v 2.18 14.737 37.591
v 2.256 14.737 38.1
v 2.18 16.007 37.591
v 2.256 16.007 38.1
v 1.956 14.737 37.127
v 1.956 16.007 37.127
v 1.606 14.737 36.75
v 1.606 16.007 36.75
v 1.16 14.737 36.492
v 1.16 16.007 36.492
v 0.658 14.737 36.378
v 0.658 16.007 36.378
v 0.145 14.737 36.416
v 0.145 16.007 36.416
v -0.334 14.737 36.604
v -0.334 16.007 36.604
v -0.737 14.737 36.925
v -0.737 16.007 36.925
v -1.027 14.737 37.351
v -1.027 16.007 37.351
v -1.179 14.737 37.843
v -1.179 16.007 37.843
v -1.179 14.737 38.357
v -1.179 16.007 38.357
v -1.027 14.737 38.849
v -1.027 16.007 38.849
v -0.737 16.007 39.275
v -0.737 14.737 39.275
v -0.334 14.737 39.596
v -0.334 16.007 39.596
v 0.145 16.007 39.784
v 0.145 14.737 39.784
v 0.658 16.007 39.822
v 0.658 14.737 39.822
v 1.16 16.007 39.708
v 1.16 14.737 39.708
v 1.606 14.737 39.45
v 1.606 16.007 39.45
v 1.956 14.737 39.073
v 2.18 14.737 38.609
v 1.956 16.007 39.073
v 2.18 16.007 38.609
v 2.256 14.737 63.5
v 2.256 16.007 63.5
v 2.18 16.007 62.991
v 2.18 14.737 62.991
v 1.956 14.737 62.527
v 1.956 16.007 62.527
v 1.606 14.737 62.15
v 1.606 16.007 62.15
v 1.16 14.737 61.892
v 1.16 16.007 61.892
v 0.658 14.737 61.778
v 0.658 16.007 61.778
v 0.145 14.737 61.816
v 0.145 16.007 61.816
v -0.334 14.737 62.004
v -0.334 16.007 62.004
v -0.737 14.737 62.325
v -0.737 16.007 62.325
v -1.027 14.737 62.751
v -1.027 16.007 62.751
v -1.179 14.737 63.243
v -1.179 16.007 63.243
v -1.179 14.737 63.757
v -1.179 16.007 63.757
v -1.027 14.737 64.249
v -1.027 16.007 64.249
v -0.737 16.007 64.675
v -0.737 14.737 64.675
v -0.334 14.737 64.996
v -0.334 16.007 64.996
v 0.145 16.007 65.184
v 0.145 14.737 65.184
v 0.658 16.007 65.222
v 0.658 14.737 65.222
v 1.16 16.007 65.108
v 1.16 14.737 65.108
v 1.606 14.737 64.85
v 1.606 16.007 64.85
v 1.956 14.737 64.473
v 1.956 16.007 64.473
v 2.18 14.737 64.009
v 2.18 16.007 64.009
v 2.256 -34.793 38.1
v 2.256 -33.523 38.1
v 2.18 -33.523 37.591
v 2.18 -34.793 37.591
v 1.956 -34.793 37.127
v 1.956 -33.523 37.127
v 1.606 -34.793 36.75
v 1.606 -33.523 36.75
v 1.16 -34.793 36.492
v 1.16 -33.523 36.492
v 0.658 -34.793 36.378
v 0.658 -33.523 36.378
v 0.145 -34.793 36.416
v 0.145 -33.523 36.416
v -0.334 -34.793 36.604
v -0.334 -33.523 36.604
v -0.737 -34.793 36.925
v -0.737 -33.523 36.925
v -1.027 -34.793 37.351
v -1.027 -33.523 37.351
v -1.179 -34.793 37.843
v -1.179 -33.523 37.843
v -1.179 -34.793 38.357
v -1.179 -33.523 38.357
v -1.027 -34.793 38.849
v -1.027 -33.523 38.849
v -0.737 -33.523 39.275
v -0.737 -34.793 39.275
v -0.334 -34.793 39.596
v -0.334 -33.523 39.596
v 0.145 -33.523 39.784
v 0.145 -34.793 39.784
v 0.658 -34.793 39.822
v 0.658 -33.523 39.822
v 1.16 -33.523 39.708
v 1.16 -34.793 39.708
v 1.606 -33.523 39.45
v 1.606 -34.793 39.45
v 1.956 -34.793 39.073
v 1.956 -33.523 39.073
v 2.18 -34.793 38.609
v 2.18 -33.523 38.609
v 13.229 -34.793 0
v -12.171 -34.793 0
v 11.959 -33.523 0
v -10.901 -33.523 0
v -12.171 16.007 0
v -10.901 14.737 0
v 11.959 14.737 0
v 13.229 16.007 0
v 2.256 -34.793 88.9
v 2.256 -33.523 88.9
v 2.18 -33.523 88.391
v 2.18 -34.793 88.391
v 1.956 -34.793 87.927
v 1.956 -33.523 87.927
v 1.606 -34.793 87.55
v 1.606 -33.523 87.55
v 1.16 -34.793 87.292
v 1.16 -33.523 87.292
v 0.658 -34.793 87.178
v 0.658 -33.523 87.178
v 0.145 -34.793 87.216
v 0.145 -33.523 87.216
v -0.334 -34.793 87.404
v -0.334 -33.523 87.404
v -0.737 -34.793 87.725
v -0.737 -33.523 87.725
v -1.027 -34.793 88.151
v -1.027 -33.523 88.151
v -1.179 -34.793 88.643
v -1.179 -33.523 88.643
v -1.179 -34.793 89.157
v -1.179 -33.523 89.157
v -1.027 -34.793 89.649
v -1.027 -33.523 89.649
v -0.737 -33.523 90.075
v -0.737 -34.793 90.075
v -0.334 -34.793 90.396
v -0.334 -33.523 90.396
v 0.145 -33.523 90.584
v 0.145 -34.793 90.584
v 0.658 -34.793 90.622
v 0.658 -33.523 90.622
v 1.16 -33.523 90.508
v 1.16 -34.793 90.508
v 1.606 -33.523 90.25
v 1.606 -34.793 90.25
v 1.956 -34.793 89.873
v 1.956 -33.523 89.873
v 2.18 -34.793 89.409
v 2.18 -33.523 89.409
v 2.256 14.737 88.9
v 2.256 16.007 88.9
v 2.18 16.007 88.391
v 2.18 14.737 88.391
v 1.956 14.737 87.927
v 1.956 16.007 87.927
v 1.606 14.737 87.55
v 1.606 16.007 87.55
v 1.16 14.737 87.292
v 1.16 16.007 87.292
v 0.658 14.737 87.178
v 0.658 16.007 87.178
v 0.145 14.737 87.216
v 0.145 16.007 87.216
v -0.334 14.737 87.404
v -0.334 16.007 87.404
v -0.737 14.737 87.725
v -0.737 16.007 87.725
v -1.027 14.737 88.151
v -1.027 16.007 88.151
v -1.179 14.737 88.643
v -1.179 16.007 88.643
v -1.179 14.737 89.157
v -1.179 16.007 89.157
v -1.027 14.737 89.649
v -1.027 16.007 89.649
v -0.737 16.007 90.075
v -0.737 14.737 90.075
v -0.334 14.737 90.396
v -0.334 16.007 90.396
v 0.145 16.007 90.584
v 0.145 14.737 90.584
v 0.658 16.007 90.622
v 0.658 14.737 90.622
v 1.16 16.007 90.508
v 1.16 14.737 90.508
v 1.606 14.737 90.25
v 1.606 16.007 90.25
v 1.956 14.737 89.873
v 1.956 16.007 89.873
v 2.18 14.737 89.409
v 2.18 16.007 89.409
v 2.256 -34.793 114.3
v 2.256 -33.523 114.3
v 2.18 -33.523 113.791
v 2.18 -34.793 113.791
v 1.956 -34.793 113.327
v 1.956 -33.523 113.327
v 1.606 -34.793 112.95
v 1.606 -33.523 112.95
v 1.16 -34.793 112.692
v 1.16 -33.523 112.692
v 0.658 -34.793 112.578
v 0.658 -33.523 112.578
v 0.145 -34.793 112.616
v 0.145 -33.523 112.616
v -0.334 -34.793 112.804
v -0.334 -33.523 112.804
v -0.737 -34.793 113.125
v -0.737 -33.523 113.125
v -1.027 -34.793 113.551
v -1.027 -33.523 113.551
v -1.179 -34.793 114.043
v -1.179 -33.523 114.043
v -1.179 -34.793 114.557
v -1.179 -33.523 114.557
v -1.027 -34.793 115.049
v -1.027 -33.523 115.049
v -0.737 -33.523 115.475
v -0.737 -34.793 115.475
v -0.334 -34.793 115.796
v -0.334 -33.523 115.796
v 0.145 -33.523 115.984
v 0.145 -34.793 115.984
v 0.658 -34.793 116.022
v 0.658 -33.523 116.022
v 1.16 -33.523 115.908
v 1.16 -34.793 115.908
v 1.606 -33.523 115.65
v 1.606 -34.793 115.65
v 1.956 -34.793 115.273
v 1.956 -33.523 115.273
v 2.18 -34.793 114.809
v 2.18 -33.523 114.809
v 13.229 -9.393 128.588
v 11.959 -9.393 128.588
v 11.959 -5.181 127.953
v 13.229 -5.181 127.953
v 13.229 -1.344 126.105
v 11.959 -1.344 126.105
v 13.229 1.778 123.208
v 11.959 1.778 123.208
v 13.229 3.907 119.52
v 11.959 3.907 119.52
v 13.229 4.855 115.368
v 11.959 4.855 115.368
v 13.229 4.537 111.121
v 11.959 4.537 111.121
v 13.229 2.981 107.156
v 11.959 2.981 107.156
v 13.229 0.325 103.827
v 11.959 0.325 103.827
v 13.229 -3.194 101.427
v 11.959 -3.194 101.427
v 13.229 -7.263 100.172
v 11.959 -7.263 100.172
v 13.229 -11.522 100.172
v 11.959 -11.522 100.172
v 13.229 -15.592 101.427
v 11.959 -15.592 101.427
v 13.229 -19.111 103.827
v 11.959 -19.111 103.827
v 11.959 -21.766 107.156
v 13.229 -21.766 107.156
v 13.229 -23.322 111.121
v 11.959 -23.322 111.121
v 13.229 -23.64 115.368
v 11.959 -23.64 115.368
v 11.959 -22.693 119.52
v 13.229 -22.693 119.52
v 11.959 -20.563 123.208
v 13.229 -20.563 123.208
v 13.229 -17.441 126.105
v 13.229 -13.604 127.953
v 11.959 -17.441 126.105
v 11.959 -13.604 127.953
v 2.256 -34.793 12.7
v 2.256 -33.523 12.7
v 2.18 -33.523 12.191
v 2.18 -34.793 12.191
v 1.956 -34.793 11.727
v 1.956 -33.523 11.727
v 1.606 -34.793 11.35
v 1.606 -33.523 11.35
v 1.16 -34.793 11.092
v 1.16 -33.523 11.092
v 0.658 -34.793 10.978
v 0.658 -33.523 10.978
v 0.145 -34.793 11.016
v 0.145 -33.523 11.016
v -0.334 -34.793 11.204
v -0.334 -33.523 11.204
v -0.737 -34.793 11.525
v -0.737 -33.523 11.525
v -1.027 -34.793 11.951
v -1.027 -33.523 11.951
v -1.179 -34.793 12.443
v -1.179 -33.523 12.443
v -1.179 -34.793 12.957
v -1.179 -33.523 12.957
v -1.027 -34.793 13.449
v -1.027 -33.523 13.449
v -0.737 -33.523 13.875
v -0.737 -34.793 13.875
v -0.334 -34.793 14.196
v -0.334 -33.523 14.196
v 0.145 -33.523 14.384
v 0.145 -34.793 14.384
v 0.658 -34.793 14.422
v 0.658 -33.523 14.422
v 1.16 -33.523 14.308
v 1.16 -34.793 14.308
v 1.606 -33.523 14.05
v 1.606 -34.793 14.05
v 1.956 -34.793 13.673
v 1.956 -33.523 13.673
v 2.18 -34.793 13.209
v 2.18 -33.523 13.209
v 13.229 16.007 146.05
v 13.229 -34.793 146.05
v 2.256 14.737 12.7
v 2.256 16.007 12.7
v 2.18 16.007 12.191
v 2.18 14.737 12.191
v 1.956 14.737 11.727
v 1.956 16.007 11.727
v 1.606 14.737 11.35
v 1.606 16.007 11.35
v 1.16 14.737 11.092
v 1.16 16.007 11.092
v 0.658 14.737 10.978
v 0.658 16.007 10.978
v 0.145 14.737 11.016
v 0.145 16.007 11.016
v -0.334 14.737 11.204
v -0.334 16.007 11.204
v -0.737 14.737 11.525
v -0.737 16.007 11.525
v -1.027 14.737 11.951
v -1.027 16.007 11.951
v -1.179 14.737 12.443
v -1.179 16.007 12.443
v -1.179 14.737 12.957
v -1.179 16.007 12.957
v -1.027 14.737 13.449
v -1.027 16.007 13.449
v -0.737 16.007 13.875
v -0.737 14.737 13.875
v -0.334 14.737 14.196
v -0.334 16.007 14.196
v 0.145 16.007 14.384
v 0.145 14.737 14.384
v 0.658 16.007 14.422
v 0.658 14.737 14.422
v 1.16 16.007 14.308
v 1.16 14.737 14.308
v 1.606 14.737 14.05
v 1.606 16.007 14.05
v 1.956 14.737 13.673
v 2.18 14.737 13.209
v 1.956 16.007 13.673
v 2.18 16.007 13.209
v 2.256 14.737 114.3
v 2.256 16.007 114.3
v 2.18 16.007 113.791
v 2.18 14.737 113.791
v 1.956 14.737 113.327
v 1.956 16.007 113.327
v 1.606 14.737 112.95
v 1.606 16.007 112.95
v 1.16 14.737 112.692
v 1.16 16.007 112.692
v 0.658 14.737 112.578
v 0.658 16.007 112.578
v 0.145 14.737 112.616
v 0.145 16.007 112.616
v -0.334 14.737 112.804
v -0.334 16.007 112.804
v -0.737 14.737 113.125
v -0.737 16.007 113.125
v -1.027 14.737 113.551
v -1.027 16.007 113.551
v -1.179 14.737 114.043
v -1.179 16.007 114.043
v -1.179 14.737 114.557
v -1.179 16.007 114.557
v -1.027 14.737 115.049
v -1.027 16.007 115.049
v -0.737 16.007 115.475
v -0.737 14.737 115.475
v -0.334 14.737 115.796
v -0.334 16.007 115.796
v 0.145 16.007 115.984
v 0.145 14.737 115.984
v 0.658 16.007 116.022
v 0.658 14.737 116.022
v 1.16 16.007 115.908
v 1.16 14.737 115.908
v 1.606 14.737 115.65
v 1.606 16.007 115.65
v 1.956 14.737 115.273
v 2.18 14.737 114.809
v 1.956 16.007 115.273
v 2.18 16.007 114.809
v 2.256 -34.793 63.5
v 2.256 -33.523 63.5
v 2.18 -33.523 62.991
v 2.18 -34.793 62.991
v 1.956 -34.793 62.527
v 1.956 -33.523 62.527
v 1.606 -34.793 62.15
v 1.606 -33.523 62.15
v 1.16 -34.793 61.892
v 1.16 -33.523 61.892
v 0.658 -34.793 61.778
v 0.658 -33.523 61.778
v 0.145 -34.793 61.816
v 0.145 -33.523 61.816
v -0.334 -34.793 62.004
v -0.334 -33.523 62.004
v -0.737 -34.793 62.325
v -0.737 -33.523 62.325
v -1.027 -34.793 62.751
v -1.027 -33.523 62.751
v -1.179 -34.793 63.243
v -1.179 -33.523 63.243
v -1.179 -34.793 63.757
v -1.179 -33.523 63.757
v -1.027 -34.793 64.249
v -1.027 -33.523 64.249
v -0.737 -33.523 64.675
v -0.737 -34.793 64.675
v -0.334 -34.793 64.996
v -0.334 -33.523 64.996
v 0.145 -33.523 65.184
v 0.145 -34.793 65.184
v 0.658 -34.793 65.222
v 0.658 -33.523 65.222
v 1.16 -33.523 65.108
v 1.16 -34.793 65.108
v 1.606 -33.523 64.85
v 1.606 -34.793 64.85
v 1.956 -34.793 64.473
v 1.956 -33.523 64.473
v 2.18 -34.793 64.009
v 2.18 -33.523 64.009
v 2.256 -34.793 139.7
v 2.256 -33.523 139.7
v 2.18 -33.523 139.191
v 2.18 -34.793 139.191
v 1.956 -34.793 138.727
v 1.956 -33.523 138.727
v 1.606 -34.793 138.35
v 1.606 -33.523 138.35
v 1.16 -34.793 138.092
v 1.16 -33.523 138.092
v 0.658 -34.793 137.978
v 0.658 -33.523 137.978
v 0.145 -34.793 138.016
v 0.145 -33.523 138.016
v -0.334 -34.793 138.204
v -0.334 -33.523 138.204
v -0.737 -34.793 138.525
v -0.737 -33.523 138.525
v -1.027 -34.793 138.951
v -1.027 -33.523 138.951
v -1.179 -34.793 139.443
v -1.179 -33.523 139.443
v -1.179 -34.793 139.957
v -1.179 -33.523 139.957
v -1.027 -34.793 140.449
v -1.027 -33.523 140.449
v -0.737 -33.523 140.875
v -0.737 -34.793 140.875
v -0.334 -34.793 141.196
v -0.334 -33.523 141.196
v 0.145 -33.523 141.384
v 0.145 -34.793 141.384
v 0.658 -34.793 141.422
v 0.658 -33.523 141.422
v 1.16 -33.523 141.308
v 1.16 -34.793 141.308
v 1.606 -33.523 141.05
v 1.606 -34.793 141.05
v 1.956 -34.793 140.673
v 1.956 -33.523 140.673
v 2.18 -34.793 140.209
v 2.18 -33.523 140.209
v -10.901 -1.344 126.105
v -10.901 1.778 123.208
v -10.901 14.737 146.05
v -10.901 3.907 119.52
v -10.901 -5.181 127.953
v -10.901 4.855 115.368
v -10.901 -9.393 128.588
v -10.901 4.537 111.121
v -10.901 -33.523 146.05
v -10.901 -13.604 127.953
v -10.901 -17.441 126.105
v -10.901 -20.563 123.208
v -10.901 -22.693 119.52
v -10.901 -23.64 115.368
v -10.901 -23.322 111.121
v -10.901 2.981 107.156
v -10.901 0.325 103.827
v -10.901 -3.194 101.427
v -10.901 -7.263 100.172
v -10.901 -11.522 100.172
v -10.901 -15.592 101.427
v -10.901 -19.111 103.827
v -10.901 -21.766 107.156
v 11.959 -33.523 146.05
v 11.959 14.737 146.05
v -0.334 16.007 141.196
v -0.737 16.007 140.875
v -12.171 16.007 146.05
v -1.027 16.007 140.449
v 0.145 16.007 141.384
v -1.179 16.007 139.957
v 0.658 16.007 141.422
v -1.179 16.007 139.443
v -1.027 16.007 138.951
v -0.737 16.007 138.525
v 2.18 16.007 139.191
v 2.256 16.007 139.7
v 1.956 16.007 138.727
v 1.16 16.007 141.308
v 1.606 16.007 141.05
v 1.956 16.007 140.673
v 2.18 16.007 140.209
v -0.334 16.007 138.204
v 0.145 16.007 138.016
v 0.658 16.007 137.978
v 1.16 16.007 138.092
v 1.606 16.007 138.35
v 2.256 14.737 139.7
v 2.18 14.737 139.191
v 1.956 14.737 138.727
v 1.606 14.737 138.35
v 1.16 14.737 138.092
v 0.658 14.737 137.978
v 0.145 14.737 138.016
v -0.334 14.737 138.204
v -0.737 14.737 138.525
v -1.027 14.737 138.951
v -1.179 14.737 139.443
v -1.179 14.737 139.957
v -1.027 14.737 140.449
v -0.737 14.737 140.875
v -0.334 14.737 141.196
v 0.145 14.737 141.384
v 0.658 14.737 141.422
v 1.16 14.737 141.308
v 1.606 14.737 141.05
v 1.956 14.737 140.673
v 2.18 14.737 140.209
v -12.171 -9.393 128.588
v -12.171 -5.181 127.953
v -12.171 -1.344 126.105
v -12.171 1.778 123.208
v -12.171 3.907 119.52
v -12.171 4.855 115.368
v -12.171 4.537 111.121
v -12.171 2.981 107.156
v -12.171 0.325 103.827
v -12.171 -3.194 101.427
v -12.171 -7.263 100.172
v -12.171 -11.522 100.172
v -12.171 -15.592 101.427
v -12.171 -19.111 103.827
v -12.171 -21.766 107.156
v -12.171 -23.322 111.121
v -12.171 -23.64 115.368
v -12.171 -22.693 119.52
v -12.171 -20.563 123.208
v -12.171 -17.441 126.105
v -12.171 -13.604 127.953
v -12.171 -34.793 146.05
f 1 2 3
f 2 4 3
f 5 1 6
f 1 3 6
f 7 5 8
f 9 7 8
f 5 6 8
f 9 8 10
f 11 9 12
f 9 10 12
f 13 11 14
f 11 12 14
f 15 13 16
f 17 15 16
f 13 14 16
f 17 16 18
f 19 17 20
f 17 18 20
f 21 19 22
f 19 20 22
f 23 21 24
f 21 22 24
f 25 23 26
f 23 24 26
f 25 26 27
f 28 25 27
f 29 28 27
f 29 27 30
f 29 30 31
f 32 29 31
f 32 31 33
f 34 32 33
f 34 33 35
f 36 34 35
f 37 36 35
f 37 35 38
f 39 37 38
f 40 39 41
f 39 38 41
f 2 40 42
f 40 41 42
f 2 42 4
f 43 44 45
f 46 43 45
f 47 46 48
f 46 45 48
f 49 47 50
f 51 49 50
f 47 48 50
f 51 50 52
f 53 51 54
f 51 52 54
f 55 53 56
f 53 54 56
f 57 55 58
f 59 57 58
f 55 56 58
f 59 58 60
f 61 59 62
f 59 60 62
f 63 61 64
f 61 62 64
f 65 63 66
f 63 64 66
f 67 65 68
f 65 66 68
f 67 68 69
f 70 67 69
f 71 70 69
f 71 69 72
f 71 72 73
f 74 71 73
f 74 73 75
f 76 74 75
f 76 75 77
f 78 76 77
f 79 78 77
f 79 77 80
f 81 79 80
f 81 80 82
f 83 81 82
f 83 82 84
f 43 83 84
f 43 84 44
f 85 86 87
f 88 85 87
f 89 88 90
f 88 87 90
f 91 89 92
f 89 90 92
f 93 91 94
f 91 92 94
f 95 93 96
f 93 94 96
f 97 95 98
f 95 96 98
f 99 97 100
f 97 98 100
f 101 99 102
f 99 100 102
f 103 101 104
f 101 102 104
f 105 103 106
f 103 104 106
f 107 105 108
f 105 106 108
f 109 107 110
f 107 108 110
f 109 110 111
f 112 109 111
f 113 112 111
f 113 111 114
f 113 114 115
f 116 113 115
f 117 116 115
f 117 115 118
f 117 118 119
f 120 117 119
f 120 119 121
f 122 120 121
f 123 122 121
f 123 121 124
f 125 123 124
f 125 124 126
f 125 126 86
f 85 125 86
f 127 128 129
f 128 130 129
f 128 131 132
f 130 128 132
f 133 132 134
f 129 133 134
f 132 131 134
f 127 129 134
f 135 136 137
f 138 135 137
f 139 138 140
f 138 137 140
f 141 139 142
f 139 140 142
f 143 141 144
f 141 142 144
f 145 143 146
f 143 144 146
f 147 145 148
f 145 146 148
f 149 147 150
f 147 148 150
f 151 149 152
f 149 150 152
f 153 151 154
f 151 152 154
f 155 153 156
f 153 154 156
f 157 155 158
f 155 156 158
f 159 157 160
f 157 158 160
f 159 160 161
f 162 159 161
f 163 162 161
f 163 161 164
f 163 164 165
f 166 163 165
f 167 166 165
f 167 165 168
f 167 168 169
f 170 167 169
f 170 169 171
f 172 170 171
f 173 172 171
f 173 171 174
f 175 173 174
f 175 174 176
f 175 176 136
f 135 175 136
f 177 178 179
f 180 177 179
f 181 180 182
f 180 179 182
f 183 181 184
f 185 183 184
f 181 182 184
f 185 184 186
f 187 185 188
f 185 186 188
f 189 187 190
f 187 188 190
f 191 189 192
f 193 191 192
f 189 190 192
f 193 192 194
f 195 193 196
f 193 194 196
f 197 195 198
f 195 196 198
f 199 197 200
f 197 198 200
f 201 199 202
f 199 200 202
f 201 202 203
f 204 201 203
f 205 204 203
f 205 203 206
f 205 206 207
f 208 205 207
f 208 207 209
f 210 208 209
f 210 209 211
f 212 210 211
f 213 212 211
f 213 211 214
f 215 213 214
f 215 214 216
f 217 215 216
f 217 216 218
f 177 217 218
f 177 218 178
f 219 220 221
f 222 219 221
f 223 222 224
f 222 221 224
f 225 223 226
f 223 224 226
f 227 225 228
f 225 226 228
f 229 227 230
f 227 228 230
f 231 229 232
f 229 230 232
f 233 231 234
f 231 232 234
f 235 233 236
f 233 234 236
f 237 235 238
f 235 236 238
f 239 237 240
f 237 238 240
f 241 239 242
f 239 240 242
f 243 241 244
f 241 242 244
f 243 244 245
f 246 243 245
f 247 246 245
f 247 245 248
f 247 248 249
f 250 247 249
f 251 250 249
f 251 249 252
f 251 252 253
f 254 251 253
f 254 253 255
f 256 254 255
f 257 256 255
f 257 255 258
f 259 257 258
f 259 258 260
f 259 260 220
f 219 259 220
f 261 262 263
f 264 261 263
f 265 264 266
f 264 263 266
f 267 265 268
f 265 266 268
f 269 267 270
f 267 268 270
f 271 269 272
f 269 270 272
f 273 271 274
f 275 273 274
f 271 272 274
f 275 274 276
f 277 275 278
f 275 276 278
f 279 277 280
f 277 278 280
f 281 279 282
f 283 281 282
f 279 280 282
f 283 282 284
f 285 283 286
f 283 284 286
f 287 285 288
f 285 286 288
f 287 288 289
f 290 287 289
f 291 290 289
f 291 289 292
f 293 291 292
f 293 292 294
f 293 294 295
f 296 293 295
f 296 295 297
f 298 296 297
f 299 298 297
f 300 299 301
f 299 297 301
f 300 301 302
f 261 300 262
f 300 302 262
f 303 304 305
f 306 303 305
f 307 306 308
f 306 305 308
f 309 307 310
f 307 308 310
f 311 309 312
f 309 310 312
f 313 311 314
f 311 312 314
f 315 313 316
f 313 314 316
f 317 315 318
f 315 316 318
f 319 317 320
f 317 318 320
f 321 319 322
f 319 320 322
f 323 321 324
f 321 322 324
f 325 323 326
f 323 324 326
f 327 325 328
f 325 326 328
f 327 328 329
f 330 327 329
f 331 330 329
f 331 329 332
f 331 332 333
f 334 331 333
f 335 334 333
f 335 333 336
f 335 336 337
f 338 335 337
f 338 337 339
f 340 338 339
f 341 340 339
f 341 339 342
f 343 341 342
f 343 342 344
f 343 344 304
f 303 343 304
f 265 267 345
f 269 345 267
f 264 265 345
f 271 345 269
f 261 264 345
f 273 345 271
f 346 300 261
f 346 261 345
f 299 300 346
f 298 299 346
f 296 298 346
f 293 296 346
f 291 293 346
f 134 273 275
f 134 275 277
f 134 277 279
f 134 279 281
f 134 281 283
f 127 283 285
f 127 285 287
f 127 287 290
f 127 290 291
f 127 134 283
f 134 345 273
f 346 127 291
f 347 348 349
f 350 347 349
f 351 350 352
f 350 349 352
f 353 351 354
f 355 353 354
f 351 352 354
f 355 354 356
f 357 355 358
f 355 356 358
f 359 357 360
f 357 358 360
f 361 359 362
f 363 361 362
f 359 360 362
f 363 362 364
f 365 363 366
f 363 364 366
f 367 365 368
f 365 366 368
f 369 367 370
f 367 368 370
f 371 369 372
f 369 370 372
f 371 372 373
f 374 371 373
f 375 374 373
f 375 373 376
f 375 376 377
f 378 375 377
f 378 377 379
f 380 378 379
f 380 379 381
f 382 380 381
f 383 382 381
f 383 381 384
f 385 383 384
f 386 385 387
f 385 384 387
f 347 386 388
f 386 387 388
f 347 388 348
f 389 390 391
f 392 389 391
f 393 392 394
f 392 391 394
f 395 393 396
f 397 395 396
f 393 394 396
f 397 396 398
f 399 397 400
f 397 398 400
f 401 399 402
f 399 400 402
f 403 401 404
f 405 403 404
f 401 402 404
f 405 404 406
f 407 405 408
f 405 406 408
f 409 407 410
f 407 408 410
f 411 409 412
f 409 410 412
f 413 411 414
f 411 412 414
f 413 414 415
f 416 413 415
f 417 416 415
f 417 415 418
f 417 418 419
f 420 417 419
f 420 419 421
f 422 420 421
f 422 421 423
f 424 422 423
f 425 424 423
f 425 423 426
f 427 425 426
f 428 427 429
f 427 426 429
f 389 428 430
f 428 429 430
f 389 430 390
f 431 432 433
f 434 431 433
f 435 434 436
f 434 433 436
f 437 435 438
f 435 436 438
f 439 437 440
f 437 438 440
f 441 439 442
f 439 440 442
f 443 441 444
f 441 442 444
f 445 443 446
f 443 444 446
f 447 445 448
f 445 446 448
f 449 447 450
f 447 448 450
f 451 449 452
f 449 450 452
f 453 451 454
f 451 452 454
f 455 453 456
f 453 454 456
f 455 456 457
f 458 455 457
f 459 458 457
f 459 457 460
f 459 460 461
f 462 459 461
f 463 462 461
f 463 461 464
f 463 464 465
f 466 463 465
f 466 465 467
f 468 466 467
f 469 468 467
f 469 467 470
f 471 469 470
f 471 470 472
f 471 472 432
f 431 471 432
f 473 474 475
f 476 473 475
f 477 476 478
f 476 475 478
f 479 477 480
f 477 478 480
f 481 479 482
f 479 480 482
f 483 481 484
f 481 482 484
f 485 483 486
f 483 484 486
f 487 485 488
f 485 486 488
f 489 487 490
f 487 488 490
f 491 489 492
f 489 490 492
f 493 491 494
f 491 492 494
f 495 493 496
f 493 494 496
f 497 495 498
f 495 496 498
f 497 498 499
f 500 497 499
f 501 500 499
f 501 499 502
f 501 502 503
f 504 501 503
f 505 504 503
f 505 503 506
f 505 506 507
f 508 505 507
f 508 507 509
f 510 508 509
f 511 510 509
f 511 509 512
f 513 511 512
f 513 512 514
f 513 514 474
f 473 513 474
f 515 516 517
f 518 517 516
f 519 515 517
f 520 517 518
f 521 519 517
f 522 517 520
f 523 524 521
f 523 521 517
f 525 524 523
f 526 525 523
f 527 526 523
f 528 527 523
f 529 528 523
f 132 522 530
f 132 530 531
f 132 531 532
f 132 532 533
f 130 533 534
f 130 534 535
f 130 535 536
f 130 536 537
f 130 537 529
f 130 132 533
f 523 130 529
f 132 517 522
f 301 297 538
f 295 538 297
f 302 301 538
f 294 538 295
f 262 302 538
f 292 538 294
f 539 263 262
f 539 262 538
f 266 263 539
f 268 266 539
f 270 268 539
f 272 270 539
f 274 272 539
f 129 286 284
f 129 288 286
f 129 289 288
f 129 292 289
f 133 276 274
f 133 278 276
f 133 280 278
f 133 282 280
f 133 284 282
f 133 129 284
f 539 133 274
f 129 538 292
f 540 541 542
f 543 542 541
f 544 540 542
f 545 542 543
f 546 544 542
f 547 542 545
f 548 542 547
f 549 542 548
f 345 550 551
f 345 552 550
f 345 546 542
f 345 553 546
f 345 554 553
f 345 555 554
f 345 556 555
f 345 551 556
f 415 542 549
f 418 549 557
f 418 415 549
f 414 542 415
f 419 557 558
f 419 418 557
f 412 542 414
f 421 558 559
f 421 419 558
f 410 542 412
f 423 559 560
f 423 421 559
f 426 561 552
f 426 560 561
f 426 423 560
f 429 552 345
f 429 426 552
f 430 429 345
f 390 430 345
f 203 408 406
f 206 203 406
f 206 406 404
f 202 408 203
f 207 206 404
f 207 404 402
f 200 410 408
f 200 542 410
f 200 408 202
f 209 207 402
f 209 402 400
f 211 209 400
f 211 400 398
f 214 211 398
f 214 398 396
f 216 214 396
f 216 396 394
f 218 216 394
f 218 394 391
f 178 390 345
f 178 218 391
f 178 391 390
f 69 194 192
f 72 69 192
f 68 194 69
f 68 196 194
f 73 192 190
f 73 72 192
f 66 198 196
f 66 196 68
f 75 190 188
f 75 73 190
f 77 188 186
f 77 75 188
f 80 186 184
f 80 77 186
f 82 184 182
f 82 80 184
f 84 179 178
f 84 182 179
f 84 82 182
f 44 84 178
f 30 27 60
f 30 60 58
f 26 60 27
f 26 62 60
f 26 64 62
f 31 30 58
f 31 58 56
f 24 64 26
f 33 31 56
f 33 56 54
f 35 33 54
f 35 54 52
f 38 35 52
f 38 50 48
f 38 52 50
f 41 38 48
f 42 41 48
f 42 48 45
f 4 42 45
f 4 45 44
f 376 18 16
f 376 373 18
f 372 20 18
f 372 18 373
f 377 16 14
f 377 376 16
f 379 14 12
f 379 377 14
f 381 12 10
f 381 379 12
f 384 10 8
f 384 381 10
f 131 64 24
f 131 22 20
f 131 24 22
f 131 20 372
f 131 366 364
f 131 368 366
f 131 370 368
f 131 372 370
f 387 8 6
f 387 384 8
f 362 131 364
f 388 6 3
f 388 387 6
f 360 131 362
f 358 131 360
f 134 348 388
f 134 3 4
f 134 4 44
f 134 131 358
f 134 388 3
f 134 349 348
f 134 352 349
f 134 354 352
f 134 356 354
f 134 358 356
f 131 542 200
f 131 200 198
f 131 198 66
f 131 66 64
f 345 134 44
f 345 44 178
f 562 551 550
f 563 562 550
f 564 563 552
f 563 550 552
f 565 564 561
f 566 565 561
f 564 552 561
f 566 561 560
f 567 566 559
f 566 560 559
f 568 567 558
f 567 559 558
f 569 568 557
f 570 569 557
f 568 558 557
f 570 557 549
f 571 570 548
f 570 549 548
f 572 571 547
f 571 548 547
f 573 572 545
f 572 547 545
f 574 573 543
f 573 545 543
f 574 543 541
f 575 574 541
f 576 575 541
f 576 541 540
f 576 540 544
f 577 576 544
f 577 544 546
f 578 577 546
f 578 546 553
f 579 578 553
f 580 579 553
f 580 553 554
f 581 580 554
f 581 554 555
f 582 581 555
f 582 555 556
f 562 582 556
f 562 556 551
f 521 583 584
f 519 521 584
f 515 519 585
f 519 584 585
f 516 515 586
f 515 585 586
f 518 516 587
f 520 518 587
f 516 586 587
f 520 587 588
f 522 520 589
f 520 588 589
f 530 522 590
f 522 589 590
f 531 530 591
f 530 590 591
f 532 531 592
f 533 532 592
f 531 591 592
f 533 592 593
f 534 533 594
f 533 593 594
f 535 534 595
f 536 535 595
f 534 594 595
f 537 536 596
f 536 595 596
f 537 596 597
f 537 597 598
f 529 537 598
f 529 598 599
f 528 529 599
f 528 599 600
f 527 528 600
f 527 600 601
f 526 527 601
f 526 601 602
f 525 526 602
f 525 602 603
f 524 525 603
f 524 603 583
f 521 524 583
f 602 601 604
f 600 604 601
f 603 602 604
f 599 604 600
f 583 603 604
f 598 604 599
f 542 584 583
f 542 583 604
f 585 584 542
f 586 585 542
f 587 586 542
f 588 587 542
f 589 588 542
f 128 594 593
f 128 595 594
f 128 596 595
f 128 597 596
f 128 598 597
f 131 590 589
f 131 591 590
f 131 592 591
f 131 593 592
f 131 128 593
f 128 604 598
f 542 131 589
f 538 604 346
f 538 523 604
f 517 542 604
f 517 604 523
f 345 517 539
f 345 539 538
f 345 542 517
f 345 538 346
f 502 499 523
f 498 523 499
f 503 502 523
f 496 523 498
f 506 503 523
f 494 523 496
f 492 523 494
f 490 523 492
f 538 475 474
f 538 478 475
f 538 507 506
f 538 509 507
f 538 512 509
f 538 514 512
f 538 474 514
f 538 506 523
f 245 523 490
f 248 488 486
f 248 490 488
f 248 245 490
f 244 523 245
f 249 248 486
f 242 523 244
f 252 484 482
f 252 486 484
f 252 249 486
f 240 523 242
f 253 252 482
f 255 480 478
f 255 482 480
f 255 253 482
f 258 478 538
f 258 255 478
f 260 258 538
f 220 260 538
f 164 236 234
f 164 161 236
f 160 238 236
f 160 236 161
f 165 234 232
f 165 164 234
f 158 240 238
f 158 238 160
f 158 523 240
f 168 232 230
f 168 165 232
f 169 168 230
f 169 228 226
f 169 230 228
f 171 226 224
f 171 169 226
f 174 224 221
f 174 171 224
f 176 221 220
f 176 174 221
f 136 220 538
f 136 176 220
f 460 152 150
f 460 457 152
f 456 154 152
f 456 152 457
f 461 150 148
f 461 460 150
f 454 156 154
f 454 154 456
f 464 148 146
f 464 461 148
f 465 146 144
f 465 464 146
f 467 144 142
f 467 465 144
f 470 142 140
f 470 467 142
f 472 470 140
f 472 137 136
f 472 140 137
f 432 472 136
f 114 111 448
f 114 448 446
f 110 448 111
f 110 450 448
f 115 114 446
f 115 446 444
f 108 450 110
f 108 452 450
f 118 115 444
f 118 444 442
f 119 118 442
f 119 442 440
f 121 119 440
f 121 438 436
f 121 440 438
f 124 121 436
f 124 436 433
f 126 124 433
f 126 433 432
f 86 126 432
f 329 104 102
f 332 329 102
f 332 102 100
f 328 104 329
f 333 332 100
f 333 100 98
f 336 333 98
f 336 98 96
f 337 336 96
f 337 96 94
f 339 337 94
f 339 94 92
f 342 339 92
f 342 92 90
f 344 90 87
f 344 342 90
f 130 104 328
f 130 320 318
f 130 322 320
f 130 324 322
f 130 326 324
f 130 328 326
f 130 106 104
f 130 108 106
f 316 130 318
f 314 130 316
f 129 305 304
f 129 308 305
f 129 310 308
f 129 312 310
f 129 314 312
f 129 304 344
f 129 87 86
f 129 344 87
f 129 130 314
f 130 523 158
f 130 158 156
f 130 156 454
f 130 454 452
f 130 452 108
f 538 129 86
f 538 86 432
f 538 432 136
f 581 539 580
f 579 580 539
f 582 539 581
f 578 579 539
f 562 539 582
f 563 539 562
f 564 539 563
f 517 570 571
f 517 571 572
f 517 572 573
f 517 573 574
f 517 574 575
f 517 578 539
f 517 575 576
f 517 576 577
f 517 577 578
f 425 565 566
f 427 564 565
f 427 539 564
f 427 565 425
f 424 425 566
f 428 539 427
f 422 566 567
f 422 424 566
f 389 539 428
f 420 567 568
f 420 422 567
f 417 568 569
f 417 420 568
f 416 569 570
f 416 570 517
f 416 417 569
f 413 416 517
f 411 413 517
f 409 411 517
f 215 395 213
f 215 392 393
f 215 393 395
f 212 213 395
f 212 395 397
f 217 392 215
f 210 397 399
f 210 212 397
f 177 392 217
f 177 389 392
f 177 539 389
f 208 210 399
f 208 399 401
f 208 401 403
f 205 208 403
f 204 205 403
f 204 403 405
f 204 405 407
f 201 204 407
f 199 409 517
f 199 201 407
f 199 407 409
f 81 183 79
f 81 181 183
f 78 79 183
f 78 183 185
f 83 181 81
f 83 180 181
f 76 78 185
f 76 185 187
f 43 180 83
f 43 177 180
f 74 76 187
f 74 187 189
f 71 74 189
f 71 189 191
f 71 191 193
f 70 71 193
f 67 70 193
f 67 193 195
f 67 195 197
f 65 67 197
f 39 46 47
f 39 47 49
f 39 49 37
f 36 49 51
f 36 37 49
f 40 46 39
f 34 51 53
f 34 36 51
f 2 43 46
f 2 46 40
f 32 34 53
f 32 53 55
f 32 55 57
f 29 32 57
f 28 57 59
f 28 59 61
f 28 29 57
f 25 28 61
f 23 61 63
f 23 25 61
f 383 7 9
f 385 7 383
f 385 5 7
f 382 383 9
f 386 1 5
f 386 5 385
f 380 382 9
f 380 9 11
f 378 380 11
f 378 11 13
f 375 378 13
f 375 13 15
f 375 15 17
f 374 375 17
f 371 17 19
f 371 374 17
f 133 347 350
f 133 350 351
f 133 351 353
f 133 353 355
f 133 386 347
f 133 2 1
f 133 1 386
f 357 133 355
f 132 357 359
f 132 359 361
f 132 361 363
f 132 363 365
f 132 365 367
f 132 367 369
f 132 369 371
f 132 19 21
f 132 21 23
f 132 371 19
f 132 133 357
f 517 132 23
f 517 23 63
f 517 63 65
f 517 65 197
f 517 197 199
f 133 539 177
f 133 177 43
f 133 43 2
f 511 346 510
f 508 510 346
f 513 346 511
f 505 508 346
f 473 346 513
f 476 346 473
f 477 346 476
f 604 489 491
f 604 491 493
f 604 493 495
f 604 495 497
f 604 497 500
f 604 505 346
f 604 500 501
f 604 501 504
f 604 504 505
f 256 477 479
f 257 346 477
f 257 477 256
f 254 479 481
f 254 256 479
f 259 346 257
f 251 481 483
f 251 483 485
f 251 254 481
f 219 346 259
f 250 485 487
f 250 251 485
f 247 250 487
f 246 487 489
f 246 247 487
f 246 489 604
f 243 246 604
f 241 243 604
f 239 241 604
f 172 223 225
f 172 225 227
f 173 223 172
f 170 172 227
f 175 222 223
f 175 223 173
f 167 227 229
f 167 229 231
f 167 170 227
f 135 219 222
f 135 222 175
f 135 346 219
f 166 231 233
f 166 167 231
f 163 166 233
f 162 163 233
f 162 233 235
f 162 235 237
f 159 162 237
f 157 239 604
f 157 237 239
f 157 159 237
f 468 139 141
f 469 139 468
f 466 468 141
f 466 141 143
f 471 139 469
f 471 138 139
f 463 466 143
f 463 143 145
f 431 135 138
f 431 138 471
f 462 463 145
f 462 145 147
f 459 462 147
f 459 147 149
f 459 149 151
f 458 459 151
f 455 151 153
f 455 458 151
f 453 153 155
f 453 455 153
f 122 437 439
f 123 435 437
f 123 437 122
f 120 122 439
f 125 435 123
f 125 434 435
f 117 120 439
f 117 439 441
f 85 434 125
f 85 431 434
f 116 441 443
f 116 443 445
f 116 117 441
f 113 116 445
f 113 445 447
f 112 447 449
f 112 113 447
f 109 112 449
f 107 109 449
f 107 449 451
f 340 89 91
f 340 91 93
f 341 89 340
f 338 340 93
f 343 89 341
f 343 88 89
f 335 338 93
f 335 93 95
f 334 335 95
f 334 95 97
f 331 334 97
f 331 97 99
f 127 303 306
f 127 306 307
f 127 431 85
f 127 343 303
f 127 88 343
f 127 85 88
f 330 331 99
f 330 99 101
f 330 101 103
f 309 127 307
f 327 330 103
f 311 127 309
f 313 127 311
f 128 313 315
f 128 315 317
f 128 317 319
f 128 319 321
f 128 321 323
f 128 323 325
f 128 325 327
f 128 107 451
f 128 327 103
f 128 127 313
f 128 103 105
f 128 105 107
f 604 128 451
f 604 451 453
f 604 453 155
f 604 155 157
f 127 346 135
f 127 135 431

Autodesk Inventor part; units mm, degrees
ref_plane "YZ Plane" through (0, 0, 0) normal (1, 0, 0) x (0, 1, 0)
ref_plane "XZ Plane" through (0, 0, 0) normal (0, 1, 0) x (-1, 0, 0)
ref_plane "XY Plane" through (0, 0, 0) normal (0, 0, 1) x (1, 0, 0)
sketch "Sketch1" plane through (0, 0, 0) normal (0, 0, 1) x (1, 0, 0)
  line L0 (-12.1708, 16.0073) -> (13.2292, 16.0073)
  line L1 (13.2292, 16.0073) -> (13.2292, -34.7927)
  line L2 (13.2292, -34.7927) -> (-12.1708, -34.7927)
  line L3 (-12.1708, -34.7927) -> (-12.1708, 16.0073)
  line L4 (11.9592, 14.7373) -> (-10.9008, 14.7373)
  line L5 (-10.9008, 14.7373) -> (-10.9008, -33.5227)
  line L6 (-10.9008, -33.5227) -> (11.9592, -33.5227)
  line L7 (11.9592, -33.5227) -> (11.9592, 14.7373)
  point P0 (0, 0)
  dimension "d0" = 25.4
  dimension "d1" = 50.8
  dimension "d2" = 1.27
extrude "Extrusion1" add sketch "Sketch1" along normal blind 146.05
sketch "Sketch2" plane through (-12.1708, 16.0073, 0) normal (0, 1, 0) x (1, 0, 0)
  circle A0 centre (12.7, -12.7) radius 1.7272
  line L0 (25.4, 0) -> (0, 0) projected
  line L1 (0, 0) -> (0, -146.05) projected
  point P0 (12.1708, 0)
  dimension "d5" = 3.4544
  dimension "d6" = 12.7
  dimension "d7" = 12.7
extrude "Extrusion2" cut sketch "Sketch2" against normal through all
pattern_linear "Rectangular Pattern1" count 15 spacing 25.4 along (0, 0, 1) of "Extrusion2"
sketch "Sketch5" plane through (-12.1708, -34.7927, 0) normal (-1, 0, 0) x (0, 0, 1)
  line L0 (0, 50.8) -> (0, 0) projected
  line L1 (95.25, 50.8) -> (146.05, 50.8)
  line L2 (146.05, 50.8) -> (146.05, 203.2)
  line L3 (146.05, 203.2) -> (95.25, 203.2)
  line L4 (95.25, 203.2) -> (95.25, 50.8)
  circle A0 centre (120.65, 101.6) radius 14.2875
  point P0 (0, 34.7927)
  point P1 (120.65, 50.8)
  dimension "d48" = 50.8
  dimension "d49" = 152.4
  dimension "d50" = 28.575
  dimension "d51" = 50.8
sketch "Sketch6" plane through (-12.1708, -34.7927, 0) normal (-1, 0, 0) x (0, 0, 1)
  circle A0 centre (114.3, 25.4) radius 14.2875
  line L0 (146.05, 50.8) -> (146.05, 0) projected
  point P0 (0, 34.7927)
  point P1 (146.05, 25.4)
  dimension "d52" = 28.575
  dimension "d53" = 31.75
extrude "Extrusion5" cut sketch "Sketch6" against normal blind 25.4
equation "\"d3\" = d13"
equation "\"d10\" = d14"
equation "\"d13\" = 146.05"
equation "\"d14\" = d13"
equation "\"d32\" = 101.6"
properties part number "ElevatorPivotBar1"
